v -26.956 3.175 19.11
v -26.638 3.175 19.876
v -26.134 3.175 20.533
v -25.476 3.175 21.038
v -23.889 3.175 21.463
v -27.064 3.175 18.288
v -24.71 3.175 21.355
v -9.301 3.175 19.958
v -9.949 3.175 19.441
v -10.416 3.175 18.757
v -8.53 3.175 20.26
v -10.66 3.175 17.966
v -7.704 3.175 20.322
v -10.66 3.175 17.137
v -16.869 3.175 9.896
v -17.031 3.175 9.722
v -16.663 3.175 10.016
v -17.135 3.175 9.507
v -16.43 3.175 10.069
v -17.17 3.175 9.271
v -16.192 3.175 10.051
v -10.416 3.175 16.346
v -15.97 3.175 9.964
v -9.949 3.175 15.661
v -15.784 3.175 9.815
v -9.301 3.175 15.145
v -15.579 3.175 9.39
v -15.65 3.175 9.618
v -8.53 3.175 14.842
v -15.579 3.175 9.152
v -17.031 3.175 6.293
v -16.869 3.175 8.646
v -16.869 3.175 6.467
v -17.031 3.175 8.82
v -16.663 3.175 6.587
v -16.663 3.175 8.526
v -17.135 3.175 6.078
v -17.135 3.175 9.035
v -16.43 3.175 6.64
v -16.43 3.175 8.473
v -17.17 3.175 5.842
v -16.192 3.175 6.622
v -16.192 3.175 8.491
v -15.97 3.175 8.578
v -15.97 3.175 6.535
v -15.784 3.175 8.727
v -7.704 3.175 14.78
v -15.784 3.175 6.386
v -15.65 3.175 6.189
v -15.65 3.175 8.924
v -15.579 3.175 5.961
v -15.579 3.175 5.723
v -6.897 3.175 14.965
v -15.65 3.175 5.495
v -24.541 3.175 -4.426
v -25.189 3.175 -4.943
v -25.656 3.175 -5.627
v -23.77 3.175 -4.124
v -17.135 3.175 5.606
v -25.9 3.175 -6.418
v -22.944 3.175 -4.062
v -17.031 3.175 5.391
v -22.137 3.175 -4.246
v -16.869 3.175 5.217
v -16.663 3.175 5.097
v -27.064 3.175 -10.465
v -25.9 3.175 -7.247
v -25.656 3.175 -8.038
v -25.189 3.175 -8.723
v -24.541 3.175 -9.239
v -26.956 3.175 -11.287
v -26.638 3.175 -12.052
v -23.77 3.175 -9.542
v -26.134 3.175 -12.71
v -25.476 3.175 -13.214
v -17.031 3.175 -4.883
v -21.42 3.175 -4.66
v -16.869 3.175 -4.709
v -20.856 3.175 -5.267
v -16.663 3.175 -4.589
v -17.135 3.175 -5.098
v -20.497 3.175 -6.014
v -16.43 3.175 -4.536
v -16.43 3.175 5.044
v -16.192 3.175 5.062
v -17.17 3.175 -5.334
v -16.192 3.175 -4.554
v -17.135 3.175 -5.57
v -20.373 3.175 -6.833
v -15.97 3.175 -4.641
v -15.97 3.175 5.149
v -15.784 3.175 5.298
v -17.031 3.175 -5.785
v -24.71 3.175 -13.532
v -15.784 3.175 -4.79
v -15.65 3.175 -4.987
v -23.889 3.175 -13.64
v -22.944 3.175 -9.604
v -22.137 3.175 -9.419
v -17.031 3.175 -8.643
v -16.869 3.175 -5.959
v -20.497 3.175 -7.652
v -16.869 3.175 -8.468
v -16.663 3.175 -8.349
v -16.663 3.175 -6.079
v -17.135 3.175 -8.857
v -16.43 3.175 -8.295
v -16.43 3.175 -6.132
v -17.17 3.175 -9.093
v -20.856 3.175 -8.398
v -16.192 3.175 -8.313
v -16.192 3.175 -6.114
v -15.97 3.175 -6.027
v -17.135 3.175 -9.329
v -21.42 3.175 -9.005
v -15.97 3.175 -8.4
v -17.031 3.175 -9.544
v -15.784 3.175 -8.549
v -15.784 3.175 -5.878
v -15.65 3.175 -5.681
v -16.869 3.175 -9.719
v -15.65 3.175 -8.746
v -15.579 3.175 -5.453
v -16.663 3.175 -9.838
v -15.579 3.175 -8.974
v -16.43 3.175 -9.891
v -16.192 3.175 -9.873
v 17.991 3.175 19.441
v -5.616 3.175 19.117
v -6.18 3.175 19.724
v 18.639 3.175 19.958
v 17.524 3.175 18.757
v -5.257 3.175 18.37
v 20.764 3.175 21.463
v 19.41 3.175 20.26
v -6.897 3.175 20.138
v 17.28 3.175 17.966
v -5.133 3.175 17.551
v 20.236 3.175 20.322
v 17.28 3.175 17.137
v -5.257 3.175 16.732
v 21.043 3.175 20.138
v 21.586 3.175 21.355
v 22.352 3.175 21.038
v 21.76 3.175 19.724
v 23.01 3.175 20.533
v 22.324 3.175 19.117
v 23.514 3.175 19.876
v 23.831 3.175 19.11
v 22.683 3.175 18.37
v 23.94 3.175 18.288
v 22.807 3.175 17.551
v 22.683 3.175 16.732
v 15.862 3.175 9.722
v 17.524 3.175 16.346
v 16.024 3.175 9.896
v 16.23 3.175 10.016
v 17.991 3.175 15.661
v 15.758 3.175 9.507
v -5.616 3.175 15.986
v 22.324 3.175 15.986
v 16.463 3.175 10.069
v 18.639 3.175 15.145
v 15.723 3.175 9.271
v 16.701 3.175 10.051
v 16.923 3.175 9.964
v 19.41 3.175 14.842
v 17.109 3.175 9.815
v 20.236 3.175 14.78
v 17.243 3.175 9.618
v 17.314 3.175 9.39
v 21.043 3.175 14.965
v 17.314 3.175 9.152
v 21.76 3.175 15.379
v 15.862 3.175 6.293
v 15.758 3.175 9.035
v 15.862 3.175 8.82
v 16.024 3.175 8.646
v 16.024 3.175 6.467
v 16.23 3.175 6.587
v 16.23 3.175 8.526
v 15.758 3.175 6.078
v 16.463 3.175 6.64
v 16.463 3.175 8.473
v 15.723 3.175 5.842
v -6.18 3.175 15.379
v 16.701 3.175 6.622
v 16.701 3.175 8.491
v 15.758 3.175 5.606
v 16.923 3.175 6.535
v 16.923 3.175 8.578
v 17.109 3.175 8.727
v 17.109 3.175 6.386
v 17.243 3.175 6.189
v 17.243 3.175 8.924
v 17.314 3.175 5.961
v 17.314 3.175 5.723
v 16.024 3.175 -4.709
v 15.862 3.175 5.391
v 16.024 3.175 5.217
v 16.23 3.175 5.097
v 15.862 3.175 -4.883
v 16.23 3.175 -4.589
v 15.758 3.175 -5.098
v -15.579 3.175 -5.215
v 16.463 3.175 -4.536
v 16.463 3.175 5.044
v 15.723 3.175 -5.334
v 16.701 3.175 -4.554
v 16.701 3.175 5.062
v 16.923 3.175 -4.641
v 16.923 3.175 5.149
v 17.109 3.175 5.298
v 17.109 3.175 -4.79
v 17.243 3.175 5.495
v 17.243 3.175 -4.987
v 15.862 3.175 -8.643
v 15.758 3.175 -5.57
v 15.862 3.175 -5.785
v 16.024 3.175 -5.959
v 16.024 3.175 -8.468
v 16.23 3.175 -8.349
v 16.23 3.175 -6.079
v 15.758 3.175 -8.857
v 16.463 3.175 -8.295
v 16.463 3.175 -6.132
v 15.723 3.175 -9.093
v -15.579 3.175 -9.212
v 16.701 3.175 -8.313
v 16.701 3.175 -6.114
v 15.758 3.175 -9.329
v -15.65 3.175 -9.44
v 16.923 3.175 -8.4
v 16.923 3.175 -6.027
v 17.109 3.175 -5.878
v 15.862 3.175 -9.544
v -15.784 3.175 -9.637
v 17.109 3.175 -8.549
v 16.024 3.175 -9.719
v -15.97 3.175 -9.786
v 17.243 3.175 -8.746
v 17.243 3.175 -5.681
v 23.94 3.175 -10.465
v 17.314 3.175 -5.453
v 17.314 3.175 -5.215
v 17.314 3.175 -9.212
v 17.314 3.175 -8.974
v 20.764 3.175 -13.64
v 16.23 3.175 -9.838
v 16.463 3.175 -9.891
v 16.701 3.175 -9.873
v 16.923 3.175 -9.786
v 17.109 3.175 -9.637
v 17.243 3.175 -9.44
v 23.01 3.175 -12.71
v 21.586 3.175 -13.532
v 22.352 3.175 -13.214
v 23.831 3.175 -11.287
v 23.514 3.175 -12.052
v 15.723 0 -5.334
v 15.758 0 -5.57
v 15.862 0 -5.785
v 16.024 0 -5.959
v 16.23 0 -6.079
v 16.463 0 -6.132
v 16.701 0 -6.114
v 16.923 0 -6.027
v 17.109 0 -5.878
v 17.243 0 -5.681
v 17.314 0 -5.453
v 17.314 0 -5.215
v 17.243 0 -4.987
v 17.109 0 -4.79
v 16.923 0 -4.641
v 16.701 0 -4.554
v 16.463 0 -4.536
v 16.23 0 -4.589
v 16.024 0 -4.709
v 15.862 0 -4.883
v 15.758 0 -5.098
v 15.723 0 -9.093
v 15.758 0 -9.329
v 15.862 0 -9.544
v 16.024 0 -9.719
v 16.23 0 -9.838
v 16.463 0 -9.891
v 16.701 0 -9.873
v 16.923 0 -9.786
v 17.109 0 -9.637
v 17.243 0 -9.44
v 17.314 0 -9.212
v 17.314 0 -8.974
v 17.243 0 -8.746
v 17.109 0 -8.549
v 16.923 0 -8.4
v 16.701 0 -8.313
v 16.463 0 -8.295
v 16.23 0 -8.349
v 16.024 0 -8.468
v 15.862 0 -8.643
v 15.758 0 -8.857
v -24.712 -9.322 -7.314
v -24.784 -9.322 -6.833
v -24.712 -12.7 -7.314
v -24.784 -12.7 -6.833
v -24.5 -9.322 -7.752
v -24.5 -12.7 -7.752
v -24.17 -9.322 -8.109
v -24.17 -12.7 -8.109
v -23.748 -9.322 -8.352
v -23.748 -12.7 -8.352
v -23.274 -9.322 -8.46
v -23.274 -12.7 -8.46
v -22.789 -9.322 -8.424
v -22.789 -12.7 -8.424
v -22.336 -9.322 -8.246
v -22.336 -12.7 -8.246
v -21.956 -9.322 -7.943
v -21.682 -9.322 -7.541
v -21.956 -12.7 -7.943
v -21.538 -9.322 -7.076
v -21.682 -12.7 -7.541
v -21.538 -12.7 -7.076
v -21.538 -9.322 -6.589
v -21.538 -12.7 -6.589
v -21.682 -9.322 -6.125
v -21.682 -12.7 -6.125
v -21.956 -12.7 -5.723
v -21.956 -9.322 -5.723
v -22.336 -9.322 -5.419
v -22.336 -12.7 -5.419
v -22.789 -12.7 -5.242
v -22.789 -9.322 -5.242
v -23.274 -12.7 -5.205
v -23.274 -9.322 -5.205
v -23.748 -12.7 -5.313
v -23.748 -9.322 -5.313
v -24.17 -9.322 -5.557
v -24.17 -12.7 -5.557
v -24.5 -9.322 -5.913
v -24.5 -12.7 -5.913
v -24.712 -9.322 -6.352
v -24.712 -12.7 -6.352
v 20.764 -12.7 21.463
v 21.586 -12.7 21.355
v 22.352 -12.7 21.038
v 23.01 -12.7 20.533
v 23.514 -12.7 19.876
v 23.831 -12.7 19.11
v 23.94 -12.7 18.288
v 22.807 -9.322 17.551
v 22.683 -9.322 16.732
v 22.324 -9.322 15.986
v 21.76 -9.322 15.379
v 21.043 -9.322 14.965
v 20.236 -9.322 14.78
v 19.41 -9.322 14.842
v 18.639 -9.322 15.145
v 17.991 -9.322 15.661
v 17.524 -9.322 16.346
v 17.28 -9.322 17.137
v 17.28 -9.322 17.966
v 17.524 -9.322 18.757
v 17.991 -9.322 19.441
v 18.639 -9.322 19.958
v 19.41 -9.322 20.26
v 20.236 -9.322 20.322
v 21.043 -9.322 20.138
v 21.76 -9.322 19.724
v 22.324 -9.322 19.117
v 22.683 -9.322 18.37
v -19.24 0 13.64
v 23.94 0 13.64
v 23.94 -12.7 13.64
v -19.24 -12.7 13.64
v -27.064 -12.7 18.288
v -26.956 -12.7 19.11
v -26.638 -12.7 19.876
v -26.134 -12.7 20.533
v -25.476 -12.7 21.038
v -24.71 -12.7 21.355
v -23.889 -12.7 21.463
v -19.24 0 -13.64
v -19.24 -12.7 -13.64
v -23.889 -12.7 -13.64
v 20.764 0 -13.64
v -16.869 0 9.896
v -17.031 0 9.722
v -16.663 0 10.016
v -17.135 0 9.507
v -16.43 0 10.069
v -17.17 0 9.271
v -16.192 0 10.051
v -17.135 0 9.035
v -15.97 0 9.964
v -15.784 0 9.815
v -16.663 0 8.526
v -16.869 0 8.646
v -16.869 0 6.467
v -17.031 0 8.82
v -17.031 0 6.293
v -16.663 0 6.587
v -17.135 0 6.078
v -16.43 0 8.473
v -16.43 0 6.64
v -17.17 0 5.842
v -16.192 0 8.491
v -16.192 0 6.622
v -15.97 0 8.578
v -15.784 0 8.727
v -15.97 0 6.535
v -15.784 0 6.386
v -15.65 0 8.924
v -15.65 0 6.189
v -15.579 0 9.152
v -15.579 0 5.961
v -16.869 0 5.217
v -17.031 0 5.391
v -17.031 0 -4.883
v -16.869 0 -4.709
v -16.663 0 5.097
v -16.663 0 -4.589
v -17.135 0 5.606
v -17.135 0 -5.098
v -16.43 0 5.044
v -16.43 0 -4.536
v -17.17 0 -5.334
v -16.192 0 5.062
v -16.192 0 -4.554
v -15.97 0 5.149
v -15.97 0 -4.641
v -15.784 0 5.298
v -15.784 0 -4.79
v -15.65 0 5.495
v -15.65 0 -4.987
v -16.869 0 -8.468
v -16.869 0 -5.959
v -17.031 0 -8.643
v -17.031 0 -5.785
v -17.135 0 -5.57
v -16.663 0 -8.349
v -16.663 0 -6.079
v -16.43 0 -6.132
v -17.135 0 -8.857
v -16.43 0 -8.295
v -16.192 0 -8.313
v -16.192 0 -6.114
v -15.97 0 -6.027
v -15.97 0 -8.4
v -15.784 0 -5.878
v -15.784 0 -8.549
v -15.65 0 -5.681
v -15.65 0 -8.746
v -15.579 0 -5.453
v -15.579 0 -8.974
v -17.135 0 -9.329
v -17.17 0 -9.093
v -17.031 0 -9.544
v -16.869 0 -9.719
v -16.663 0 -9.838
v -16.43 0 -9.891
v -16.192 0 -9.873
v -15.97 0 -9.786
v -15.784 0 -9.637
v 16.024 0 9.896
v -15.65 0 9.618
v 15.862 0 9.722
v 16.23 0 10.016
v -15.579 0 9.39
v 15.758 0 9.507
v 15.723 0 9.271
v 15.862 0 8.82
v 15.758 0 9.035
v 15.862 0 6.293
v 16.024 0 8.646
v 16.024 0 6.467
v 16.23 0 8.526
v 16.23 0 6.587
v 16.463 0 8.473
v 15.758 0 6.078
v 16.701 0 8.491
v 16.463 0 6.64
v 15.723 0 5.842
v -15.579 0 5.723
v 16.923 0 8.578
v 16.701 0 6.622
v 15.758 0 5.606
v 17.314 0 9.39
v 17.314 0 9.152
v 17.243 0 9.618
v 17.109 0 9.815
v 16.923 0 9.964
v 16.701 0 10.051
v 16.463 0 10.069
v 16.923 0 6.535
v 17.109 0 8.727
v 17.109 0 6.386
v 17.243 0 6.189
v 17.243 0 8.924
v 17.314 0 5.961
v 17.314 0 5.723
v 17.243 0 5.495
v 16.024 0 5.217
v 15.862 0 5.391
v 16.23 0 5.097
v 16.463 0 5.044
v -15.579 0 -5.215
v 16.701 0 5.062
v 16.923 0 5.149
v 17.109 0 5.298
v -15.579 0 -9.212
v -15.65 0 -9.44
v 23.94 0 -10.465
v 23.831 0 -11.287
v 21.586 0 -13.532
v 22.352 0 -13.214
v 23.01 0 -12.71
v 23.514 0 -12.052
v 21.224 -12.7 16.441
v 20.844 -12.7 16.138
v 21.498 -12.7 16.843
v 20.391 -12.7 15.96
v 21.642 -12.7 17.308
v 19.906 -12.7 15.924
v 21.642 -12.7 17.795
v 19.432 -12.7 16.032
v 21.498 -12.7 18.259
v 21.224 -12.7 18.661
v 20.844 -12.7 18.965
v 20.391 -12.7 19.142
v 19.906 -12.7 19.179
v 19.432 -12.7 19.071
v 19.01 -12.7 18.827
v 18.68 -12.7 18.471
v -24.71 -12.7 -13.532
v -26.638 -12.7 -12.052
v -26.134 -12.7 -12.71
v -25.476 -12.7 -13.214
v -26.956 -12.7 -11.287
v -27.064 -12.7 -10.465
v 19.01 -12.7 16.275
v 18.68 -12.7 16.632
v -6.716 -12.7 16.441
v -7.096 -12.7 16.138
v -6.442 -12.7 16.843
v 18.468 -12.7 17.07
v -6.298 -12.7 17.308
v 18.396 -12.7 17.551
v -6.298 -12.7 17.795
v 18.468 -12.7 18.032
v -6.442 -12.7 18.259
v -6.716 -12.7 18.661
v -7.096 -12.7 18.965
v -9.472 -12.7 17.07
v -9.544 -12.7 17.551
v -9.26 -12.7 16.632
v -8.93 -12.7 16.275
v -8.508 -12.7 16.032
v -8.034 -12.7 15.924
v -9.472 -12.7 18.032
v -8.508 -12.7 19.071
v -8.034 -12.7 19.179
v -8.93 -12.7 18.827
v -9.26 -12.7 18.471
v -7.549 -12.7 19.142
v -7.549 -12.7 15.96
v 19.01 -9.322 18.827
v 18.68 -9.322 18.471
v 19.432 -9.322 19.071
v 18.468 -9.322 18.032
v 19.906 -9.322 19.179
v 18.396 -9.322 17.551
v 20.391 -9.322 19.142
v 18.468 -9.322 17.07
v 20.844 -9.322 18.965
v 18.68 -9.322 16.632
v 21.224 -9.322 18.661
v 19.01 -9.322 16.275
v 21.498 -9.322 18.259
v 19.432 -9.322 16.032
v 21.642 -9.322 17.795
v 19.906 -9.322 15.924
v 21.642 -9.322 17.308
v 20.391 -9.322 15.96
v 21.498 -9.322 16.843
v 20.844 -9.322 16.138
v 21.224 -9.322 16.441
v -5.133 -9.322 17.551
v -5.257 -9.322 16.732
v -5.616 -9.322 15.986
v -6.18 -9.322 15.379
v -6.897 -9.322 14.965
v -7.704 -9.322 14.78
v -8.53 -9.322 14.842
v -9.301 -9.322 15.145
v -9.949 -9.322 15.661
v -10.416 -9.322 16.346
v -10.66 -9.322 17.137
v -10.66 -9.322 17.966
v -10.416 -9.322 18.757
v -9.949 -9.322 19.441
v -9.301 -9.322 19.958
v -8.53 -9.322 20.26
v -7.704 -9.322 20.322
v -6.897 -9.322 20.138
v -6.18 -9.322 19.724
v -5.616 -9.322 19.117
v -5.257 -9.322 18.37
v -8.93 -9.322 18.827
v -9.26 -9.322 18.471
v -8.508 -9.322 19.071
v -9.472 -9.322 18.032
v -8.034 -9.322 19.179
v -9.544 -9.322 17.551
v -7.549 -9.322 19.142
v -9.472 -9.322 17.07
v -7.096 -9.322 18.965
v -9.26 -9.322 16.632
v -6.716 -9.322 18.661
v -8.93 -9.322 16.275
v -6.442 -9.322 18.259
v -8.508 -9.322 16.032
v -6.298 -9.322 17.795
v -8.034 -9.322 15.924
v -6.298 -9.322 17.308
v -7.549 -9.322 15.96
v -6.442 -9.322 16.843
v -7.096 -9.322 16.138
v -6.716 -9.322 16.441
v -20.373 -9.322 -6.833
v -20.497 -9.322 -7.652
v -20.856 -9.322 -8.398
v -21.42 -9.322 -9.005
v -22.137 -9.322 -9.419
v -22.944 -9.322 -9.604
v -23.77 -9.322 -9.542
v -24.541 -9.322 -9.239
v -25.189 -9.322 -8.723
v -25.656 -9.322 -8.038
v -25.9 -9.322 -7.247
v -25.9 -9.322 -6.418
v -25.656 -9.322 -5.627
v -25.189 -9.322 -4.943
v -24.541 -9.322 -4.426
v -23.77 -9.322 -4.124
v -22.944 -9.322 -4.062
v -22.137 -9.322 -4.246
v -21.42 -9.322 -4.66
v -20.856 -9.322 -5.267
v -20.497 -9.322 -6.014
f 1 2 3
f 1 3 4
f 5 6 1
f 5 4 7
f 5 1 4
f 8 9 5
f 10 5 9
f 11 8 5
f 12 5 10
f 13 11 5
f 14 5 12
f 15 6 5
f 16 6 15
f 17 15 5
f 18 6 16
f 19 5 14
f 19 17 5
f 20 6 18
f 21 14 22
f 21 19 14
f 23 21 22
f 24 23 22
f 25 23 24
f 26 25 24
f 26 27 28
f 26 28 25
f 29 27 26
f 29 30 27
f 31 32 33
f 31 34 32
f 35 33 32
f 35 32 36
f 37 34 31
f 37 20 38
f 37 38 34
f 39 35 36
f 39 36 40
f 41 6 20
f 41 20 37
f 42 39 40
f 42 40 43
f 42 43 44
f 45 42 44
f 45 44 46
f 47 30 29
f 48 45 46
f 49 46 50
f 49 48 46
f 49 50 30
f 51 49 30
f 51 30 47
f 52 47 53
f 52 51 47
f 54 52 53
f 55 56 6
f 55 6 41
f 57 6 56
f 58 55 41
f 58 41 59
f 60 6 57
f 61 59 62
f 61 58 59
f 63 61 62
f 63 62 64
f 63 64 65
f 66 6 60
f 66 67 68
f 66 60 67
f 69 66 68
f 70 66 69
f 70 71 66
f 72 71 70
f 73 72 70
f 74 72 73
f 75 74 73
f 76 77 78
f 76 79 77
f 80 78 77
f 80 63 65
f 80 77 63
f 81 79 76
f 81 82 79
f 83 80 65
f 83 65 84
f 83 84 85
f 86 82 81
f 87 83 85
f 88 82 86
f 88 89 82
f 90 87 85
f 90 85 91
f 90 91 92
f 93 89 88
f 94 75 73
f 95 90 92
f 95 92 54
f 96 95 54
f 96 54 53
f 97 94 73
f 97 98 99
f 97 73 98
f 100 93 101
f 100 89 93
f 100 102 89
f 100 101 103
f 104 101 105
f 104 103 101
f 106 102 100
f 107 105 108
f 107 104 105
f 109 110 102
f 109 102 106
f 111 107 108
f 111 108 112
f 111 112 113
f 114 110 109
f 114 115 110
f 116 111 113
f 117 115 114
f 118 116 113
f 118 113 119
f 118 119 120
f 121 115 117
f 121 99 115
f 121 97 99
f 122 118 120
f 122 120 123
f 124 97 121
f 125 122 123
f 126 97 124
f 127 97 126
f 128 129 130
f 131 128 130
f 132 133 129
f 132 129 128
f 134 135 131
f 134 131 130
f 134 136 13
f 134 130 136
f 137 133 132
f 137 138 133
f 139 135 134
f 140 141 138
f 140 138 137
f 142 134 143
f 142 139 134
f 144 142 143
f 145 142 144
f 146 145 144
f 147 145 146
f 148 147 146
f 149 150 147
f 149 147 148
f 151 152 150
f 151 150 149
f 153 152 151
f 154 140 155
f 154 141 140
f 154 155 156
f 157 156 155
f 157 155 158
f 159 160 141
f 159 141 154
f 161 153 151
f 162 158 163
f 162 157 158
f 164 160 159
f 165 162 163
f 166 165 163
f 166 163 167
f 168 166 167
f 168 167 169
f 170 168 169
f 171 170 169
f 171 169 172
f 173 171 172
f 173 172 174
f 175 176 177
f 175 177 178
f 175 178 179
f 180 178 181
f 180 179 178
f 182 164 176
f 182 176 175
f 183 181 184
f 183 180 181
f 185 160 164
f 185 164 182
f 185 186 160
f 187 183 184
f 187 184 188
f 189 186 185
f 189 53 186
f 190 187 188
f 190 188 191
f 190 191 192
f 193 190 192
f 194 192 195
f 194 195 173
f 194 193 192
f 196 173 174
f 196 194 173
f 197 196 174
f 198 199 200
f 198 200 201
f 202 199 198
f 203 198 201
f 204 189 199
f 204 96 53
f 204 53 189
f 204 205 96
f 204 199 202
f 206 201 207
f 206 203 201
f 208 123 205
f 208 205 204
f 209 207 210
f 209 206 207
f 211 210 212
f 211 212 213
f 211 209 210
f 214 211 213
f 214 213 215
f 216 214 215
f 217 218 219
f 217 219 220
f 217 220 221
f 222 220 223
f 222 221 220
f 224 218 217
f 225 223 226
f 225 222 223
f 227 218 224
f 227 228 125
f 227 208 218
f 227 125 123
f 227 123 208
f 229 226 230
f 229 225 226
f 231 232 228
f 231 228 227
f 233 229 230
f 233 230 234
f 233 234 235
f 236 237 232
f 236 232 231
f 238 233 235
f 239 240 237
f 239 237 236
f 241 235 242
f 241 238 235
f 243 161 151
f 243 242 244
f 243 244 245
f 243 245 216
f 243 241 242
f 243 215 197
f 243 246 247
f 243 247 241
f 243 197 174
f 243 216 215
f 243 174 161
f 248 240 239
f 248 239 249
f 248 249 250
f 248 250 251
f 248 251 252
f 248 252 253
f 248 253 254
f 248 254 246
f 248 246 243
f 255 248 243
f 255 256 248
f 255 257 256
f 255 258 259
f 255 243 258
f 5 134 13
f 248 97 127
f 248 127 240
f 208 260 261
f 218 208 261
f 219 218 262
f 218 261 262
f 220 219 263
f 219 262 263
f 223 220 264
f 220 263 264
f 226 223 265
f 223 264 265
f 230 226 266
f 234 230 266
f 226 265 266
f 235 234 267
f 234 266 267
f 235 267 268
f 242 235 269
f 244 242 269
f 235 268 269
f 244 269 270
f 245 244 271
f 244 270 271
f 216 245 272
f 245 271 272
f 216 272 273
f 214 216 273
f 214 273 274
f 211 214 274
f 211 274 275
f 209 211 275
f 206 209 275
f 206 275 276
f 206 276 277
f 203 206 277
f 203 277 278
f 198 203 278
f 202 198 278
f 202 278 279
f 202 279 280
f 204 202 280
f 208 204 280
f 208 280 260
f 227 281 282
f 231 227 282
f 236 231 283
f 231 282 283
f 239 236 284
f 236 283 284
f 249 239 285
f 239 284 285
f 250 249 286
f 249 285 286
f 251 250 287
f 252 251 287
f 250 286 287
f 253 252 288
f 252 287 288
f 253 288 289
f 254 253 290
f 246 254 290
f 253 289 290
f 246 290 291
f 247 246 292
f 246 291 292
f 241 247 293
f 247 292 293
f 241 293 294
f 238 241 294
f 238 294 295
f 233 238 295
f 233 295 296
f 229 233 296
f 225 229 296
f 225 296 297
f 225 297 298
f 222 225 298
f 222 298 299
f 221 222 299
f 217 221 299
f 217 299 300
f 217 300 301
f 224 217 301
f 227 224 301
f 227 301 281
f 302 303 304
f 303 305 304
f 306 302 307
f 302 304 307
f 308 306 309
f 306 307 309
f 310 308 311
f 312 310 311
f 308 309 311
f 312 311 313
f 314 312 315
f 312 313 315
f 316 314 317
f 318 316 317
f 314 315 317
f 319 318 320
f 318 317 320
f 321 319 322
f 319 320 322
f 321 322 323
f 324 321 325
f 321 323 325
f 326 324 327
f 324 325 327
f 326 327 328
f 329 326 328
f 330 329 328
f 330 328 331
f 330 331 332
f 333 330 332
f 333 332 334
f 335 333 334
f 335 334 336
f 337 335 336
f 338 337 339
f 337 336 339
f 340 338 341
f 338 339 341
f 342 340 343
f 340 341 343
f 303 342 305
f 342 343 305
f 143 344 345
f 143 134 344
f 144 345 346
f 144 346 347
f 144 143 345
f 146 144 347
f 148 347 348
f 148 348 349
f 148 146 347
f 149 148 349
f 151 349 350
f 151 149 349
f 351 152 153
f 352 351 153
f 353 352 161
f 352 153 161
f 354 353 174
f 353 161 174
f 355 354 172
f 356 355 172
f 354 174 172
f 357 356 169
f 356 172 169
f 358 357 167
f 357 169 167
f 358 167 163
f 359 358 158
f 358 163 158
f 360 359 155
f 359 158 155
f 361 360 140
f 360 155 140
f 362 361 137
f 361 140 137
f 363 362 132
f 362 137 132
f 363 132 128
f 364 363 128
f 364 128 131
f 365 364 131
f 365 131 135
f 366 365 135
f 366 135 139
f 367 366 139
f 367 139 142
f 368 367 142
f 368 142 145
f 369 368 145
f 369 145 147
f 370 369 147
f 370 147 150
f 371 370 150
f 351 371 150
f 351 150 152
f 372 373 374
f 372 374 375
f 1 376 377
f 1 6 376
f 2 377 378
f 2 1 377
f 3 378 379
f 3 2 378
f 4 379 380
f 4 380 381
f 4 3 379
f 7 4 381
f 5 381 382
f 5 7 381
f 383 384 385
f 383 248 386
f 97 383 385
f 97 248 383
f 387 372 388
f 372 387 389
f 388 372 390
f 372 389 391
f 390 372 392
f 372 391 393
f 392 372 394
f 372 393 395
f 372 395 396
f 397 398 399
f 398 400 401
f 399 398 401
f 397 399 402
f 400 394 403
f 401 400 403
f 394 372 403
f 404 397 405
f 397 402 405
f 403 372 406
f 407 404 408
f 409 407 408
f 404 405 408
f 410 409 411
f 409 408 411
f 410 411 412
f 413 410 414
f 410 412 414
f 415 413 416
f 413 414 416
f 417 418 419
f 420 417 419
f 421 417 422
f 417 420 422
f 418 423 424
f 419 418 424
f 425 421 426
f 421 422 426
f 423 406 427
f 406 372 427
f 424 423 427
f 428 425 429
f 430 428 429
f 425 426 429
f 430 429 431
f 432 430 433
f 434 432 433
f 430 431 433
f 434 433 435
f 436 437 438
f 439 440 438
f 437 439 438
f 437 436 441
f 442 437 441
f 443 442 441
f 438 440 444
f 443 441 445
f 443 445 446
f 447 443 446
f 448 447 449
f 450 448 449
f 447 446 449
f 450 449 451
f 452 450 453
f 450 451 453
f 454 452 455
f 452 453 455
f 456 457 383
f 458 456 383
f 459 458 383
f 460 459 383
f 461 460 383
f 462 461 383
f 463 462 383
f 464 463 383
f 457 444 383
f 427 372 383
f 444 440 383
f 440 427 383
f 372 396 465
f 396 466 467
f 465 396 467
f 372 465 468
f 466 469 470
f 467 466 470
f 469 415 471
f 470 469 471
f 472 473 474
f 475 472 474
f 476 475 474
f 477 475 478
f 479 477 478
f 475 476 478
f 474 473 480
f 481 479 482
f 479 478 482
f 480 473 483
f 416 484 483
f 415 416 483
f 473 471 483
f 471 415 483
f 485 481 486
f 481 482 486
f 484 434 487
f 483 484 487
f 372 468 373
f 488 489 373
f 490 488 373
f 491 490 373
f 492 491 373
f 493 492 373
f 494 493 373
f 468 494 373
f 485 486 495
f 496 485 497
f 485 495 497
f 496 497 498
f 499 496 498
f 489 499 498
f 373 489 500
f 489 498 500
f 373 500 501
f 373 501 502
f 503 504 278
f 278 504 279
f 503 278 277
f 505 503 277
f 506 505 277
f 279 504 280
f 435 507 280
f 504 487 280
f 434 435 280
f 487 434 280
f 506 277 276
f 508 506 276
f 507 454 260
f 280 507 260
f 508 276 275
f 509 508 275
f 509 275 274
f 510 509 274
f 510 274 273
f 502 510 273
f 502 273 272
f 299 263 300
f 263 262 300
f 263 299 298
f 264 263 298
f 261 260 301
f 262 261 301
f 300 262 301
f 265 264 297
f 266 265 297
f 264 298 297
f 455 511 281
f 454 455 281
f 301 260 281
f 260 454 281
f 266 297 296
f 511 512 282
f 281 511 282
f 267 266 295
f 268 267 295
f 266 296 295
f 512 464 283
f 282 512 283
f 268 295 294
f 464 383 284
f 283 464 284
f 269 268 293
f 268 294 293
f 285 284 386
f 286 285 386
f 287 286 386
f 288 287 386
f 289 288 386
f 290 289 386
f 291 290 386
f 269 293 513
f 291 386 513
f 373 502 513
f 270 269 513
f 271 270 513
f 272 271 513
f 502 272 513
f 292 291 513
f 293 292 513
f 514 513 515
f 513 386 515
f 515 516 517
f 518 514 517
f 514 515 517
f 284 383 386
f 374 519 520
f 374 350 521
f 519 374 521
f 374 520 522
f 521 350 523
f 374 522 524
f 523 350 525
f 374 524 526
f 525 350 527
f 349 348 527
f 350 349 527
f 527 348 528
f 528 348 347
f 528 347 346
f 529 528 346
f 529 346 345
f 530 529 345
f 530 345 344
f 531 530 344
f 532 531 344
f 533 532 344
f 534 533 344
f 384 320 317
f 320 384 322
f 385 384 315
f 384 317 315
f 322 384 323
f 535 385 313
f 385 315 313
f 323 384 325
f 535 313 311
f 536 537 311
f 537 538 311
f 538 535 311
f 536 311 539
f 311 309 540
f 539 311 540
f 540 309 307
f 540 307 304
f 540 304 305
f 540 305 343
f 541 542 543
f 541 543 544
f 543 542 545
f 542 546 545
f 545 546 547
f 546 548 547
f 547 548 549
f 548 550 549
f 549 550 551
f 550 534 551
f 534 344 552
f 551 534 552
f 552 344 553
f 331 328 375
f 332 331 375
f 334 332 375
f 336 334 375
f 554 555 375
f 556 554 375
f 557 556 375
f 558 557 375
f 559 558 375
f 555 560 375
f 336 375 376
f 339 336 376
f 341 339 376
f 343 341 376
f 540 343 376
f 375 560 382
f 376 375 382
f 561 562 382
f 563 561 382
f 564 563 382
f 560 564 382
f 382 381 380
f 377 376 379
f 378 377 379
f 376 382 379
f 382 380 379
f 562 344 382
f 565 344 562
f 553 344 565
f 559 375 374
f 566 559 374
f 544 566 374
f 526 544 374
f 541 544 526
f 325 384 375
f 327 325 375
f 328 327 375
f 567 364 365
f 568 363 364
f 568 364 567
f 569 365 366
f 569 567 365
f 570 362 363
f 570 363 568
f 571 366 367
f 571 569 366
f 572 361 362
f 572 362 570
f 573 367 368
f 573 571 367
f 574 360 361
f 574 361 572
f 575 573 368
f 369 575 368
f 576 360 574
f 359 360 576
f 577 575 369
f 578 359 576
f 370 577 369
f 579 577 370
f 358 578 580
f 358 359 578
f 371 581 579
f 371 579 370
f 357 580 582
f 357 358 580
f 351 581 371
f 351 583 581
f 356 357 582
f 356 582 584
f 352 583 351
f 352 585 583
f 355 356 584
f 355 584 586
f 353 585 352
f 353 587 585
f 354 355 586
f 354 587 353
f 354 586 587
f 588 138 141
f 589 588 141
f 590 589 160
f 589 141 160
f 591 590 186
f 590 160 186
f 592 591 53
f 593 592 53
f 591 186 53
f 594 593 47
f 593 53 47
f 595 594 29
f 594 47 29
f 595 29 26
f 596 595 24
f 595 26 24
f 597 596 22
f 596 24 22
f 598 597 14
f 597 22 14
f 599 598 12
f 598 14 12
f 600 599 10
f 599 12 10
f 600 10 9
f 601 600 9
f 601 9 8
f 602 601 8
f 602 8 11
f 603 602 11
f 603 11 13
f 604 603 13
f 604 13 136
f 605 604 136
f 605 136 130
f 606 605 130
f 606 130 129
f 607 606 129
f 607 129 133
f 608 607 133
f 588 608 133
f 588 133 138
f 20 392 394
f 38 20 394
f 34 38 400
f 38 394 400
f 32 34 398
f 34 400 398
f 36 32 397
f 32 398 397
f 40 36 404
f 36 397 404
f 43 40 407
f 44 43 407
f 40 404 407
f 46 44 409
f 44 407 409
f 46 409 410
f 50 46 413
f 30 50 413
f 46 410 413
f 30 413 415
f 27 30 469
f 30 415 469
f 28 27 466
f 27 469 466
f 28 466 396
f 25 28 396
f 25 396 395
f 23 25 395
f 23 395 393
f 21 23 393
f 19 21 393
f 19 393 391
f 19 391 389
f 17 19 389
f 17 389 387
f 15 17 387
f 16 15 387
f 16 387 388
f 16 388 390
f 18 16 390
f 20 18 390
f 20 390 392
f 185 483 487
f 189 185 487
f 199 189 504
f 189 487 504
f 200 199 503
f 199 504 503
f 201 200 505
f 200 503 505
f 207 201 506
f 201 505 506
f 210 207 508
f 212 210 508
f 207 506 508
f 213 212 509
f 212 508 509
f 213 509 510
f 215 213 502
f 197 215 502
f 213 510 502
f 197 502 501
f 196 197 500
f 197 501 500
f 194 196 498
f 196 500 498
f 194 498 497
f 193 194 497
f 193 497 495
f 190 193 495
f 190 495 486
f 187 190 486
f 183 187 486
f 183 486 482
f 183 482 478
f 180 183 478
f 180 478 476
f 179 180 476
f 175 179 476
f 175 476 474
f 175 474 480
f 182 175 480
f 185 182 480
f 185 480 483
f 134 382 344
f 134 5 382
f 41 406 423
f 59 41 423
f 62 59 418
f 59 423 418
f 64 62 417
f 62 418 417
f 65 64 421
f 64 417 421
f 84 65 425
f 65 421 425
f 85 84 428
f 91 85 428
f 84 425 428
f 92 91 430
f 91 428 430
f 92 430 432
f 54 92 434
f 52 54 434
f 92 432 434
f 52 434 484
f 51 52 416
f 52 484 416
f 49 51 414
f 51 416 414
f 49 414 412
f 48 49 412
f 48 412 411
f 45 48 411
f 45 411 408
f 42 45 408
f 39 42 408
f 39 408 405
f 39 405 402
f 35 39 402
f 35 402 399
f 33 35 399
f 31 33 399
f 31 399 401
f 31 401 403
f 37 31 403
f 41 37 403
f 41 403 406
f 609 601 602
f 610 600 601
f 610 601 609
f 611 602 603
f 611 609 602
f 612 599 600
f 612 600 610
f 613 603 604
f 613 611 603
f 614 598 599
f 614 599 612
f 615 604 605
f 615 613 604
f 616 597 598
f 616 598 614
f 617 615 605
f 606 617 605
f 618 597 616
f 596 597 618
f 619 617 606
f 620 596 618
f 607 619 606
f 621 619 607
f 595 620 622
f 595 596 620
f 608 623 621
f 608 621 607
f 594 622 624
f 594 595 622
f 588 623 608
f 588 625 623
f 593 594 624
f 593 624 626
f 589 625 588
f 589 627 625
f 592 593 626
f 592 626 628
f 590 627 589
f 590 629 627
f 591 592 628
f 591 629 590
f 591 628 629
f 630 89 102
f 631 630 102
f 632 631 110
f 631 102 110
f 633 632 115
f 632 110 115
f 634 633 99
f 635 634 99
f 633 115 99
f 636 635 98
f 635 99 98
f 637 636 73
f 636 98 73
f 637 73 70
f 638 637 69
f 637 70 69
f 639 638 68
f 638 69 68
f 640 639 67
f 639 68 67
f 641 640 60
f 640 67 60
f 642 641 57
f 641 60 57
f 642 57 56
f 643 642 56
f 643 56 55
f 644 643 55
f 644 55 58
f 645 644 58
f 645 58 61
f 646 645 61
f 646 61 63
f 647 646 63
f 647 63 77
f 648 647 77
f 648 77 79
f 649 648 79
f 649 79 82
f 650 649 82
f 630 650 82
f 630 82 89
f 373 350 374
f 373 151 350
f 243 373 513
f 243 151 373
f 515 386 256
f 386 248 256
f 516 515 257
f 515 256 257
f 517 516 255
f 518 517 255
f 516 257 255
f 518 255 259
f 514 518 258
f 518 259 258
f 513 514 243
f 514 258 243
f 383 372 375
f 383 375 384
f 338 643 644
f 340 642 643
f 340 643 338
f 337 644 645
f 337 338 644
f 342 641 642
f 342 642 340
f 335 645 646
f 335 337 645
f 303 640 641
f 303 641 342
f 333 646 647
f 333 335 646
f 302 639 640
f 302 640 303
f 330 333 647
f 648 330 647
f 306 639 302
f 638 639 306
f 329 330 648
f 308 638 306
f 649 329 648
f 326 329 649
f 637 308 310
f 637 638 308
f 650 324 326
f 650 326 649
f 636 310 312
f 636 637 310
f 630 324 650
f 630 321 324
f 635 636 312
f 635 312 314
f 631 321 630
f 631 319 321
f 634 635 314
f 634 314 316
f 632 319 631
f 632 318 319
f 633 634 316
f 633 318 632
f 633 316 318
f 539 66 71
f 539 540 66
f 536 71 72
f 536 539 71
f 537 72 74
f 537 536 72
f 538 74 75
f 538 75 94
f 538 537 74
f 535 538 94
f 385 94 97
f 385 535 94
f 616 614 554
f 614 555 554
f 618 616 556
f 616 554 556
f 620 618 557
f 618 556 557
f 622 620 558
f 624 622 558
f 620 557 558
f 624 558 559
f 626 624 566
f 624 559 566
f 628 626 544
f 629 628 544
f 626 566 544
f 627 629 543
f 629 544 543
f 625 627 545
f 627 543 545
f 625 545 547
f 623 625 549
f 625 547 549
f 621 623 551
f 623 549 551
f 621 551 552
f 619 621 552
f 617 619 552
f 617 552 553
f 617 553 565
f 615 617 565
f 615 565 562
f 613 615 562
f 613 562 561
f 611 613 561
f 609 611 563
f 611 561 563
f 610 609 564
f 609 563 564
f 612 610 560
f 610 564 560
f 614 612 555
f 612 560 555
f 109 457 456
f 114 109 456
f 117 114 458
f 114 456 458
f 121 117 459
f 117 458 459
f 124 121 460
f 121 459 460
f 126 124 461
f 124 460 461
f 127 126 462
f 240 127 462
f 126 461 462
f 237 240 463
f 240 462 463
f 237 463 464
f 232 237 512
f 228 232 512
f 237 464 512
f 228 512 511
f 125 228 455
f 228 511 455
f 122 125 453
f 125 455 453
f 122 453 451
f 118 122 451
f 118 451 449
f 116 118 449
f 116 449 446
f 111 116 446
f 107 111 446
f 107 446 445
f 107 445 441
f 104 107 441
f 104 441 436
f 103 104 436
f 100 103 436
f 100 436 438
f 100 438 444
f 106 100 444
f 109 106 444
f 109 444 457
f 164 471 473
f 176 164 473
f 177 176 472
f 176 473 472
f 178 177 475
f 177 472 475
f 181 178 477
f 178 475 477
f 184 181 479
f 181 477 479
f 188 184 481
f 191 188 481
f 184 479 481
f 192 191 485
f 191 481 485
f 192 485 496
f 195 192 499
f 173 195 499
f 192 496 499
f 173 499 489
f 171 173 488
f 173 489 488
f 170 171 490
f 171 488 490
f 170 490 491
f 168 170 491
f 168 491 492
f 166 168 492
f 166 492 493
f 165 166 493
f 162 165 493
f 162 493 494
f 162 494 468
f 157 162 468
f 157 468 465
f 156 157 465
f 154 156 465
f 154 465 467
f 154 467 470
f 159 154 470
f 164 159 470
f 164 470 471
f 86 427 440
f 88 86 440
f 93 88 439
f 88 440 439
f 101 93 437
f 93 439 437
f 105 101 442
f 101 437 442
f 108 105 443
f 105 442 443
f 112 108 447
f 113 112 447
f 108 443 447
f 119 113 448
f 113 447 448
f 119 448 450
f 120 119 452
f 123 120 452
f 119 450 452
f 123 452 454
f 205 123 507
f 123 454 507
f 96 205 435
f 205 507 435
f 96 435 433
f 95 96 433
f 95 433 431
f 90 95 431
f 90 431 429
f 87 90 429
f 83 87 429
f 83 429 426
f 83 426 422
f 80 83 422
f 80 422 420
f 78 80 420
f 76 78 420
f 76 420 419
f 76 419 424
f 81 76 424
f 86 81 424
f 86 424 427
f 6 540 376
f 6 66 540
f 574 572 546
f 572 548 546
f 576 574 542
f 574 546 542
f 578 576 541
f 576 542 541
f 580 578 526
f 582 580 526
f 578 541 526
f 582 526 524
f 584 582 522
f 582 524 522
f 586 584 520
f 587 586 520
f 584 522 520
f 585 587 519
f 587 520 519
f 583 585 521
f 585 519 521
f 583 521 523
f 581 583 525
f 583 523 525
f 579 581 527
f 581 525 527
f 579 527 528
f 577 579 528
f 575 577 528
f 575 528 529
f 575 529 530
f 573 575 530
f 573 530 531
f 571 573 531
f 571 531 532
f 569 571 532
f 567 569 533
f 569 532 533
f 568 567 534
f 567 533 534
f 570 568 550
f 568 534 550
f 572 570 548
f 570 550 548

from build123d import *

# Parameters (mm, degrees)
SKETCH2_W                                      = 51.0032
SKETCH2_H                                      = 35.1028
BOSS_EXTRUDE1_DEPTH                            = 3.175
BOSS_EXTRUDE3_DEPTH                            = 12.7
M2X0_4_TAPPED_HOLE2_D                          = 1.6
CBORE_FOR_4_SOCKET_HEAD_CAP_SCREW4_D           = 3.2639
CBORE_FOR_4_SOCKET_HEAD_CAP_SCREW4_CBORE_D     = 5.55752
CBORE_FOR_4_SOCKET_HEAD_CAP_SCREW4_CBORE_DEPTH = 12.4968
FILLET1_R                                      = 3.175


with BuildPart() as part:
    # Sketch2 → Boss-Extrude1 (new body)
    with BuildSketch(Plane(origin=(0, 0, 0), x_dir=(1, 0, 0), z_dir=(0, 1, 0))):
        with Locations((-1.5621, -3.9116)):
            Rectangle(SKETCH2_W, SKETCH2_H)
    extrude(amount=BOSS_EXTRUDE1_DEPTH)

    # Sketch14 → Boss-Extrude3 (add)
    with BuildSketch(Plane.XZ):
        Polygon((-27.0637, -13.6398), (-27.0637, 21.463), (23.9395, 21.463), (23.9395, 13.6398), (-19.2405, 13.6398), (-19.2405, -13.6398), align=None)
    extrude(amount=BOSS_EXTRUDE3_DEPTH)

    # M2x0.4 Tapped Hole2 (through all)
    with Locations(Plane(origin=(0, 3.175, 0), x_dir=(1, 0, 0), z_dir=(0, 1, 0))):
        with Locations((-16.3703, 9.0932), (-16.3703, 5.334), (-16.3703, -5.842), (-16.3703, -9.271), (16.5227, -9.271), (16.5227, -5.842), (16.5227, 5.334), (16.5227, 9.0932)):
            Hole(M2X0_4_TAPPED_HOLE2_D / 2)

    # CBORE for #4 Socket Head Cap Screw4 (through all)
    with Locations(Plane(origin=(0, 3.175, 0), x_dir=(1, 0, 0), z_dir=(0, 1, 0))):
        with Locations((-23.1521, 6.8326), (-7.9121, -17.5514), (20.0279, -17.5514)):
            CounterBoreHole(CBORE_FOR_4_SOCKET_HEAD_CAP_SCREW4_D / 2, CBORE_FOR_4_SOCKET_HEAD_CAP_SCREW4_CBORE_D / 2, CBORE_FOR_4_SOCKET_HEAD_CAP_SCREW4_CBORE_DEPTH)

    # Fillet1
    fillet1_edges = [part.edges().sort_by_distance(p)[0] for p in [
        (23.9395, -4.7625, 21.463),
        (23.9395, 1.5875, -13.6398),
        (-27.0637, -4.7625, -13.6398),
        (-27.0637, -4.7625, 21.463),
    ]]
    fillet(fillet1_edges, radius=FILLET1_R)


solid = part.part
